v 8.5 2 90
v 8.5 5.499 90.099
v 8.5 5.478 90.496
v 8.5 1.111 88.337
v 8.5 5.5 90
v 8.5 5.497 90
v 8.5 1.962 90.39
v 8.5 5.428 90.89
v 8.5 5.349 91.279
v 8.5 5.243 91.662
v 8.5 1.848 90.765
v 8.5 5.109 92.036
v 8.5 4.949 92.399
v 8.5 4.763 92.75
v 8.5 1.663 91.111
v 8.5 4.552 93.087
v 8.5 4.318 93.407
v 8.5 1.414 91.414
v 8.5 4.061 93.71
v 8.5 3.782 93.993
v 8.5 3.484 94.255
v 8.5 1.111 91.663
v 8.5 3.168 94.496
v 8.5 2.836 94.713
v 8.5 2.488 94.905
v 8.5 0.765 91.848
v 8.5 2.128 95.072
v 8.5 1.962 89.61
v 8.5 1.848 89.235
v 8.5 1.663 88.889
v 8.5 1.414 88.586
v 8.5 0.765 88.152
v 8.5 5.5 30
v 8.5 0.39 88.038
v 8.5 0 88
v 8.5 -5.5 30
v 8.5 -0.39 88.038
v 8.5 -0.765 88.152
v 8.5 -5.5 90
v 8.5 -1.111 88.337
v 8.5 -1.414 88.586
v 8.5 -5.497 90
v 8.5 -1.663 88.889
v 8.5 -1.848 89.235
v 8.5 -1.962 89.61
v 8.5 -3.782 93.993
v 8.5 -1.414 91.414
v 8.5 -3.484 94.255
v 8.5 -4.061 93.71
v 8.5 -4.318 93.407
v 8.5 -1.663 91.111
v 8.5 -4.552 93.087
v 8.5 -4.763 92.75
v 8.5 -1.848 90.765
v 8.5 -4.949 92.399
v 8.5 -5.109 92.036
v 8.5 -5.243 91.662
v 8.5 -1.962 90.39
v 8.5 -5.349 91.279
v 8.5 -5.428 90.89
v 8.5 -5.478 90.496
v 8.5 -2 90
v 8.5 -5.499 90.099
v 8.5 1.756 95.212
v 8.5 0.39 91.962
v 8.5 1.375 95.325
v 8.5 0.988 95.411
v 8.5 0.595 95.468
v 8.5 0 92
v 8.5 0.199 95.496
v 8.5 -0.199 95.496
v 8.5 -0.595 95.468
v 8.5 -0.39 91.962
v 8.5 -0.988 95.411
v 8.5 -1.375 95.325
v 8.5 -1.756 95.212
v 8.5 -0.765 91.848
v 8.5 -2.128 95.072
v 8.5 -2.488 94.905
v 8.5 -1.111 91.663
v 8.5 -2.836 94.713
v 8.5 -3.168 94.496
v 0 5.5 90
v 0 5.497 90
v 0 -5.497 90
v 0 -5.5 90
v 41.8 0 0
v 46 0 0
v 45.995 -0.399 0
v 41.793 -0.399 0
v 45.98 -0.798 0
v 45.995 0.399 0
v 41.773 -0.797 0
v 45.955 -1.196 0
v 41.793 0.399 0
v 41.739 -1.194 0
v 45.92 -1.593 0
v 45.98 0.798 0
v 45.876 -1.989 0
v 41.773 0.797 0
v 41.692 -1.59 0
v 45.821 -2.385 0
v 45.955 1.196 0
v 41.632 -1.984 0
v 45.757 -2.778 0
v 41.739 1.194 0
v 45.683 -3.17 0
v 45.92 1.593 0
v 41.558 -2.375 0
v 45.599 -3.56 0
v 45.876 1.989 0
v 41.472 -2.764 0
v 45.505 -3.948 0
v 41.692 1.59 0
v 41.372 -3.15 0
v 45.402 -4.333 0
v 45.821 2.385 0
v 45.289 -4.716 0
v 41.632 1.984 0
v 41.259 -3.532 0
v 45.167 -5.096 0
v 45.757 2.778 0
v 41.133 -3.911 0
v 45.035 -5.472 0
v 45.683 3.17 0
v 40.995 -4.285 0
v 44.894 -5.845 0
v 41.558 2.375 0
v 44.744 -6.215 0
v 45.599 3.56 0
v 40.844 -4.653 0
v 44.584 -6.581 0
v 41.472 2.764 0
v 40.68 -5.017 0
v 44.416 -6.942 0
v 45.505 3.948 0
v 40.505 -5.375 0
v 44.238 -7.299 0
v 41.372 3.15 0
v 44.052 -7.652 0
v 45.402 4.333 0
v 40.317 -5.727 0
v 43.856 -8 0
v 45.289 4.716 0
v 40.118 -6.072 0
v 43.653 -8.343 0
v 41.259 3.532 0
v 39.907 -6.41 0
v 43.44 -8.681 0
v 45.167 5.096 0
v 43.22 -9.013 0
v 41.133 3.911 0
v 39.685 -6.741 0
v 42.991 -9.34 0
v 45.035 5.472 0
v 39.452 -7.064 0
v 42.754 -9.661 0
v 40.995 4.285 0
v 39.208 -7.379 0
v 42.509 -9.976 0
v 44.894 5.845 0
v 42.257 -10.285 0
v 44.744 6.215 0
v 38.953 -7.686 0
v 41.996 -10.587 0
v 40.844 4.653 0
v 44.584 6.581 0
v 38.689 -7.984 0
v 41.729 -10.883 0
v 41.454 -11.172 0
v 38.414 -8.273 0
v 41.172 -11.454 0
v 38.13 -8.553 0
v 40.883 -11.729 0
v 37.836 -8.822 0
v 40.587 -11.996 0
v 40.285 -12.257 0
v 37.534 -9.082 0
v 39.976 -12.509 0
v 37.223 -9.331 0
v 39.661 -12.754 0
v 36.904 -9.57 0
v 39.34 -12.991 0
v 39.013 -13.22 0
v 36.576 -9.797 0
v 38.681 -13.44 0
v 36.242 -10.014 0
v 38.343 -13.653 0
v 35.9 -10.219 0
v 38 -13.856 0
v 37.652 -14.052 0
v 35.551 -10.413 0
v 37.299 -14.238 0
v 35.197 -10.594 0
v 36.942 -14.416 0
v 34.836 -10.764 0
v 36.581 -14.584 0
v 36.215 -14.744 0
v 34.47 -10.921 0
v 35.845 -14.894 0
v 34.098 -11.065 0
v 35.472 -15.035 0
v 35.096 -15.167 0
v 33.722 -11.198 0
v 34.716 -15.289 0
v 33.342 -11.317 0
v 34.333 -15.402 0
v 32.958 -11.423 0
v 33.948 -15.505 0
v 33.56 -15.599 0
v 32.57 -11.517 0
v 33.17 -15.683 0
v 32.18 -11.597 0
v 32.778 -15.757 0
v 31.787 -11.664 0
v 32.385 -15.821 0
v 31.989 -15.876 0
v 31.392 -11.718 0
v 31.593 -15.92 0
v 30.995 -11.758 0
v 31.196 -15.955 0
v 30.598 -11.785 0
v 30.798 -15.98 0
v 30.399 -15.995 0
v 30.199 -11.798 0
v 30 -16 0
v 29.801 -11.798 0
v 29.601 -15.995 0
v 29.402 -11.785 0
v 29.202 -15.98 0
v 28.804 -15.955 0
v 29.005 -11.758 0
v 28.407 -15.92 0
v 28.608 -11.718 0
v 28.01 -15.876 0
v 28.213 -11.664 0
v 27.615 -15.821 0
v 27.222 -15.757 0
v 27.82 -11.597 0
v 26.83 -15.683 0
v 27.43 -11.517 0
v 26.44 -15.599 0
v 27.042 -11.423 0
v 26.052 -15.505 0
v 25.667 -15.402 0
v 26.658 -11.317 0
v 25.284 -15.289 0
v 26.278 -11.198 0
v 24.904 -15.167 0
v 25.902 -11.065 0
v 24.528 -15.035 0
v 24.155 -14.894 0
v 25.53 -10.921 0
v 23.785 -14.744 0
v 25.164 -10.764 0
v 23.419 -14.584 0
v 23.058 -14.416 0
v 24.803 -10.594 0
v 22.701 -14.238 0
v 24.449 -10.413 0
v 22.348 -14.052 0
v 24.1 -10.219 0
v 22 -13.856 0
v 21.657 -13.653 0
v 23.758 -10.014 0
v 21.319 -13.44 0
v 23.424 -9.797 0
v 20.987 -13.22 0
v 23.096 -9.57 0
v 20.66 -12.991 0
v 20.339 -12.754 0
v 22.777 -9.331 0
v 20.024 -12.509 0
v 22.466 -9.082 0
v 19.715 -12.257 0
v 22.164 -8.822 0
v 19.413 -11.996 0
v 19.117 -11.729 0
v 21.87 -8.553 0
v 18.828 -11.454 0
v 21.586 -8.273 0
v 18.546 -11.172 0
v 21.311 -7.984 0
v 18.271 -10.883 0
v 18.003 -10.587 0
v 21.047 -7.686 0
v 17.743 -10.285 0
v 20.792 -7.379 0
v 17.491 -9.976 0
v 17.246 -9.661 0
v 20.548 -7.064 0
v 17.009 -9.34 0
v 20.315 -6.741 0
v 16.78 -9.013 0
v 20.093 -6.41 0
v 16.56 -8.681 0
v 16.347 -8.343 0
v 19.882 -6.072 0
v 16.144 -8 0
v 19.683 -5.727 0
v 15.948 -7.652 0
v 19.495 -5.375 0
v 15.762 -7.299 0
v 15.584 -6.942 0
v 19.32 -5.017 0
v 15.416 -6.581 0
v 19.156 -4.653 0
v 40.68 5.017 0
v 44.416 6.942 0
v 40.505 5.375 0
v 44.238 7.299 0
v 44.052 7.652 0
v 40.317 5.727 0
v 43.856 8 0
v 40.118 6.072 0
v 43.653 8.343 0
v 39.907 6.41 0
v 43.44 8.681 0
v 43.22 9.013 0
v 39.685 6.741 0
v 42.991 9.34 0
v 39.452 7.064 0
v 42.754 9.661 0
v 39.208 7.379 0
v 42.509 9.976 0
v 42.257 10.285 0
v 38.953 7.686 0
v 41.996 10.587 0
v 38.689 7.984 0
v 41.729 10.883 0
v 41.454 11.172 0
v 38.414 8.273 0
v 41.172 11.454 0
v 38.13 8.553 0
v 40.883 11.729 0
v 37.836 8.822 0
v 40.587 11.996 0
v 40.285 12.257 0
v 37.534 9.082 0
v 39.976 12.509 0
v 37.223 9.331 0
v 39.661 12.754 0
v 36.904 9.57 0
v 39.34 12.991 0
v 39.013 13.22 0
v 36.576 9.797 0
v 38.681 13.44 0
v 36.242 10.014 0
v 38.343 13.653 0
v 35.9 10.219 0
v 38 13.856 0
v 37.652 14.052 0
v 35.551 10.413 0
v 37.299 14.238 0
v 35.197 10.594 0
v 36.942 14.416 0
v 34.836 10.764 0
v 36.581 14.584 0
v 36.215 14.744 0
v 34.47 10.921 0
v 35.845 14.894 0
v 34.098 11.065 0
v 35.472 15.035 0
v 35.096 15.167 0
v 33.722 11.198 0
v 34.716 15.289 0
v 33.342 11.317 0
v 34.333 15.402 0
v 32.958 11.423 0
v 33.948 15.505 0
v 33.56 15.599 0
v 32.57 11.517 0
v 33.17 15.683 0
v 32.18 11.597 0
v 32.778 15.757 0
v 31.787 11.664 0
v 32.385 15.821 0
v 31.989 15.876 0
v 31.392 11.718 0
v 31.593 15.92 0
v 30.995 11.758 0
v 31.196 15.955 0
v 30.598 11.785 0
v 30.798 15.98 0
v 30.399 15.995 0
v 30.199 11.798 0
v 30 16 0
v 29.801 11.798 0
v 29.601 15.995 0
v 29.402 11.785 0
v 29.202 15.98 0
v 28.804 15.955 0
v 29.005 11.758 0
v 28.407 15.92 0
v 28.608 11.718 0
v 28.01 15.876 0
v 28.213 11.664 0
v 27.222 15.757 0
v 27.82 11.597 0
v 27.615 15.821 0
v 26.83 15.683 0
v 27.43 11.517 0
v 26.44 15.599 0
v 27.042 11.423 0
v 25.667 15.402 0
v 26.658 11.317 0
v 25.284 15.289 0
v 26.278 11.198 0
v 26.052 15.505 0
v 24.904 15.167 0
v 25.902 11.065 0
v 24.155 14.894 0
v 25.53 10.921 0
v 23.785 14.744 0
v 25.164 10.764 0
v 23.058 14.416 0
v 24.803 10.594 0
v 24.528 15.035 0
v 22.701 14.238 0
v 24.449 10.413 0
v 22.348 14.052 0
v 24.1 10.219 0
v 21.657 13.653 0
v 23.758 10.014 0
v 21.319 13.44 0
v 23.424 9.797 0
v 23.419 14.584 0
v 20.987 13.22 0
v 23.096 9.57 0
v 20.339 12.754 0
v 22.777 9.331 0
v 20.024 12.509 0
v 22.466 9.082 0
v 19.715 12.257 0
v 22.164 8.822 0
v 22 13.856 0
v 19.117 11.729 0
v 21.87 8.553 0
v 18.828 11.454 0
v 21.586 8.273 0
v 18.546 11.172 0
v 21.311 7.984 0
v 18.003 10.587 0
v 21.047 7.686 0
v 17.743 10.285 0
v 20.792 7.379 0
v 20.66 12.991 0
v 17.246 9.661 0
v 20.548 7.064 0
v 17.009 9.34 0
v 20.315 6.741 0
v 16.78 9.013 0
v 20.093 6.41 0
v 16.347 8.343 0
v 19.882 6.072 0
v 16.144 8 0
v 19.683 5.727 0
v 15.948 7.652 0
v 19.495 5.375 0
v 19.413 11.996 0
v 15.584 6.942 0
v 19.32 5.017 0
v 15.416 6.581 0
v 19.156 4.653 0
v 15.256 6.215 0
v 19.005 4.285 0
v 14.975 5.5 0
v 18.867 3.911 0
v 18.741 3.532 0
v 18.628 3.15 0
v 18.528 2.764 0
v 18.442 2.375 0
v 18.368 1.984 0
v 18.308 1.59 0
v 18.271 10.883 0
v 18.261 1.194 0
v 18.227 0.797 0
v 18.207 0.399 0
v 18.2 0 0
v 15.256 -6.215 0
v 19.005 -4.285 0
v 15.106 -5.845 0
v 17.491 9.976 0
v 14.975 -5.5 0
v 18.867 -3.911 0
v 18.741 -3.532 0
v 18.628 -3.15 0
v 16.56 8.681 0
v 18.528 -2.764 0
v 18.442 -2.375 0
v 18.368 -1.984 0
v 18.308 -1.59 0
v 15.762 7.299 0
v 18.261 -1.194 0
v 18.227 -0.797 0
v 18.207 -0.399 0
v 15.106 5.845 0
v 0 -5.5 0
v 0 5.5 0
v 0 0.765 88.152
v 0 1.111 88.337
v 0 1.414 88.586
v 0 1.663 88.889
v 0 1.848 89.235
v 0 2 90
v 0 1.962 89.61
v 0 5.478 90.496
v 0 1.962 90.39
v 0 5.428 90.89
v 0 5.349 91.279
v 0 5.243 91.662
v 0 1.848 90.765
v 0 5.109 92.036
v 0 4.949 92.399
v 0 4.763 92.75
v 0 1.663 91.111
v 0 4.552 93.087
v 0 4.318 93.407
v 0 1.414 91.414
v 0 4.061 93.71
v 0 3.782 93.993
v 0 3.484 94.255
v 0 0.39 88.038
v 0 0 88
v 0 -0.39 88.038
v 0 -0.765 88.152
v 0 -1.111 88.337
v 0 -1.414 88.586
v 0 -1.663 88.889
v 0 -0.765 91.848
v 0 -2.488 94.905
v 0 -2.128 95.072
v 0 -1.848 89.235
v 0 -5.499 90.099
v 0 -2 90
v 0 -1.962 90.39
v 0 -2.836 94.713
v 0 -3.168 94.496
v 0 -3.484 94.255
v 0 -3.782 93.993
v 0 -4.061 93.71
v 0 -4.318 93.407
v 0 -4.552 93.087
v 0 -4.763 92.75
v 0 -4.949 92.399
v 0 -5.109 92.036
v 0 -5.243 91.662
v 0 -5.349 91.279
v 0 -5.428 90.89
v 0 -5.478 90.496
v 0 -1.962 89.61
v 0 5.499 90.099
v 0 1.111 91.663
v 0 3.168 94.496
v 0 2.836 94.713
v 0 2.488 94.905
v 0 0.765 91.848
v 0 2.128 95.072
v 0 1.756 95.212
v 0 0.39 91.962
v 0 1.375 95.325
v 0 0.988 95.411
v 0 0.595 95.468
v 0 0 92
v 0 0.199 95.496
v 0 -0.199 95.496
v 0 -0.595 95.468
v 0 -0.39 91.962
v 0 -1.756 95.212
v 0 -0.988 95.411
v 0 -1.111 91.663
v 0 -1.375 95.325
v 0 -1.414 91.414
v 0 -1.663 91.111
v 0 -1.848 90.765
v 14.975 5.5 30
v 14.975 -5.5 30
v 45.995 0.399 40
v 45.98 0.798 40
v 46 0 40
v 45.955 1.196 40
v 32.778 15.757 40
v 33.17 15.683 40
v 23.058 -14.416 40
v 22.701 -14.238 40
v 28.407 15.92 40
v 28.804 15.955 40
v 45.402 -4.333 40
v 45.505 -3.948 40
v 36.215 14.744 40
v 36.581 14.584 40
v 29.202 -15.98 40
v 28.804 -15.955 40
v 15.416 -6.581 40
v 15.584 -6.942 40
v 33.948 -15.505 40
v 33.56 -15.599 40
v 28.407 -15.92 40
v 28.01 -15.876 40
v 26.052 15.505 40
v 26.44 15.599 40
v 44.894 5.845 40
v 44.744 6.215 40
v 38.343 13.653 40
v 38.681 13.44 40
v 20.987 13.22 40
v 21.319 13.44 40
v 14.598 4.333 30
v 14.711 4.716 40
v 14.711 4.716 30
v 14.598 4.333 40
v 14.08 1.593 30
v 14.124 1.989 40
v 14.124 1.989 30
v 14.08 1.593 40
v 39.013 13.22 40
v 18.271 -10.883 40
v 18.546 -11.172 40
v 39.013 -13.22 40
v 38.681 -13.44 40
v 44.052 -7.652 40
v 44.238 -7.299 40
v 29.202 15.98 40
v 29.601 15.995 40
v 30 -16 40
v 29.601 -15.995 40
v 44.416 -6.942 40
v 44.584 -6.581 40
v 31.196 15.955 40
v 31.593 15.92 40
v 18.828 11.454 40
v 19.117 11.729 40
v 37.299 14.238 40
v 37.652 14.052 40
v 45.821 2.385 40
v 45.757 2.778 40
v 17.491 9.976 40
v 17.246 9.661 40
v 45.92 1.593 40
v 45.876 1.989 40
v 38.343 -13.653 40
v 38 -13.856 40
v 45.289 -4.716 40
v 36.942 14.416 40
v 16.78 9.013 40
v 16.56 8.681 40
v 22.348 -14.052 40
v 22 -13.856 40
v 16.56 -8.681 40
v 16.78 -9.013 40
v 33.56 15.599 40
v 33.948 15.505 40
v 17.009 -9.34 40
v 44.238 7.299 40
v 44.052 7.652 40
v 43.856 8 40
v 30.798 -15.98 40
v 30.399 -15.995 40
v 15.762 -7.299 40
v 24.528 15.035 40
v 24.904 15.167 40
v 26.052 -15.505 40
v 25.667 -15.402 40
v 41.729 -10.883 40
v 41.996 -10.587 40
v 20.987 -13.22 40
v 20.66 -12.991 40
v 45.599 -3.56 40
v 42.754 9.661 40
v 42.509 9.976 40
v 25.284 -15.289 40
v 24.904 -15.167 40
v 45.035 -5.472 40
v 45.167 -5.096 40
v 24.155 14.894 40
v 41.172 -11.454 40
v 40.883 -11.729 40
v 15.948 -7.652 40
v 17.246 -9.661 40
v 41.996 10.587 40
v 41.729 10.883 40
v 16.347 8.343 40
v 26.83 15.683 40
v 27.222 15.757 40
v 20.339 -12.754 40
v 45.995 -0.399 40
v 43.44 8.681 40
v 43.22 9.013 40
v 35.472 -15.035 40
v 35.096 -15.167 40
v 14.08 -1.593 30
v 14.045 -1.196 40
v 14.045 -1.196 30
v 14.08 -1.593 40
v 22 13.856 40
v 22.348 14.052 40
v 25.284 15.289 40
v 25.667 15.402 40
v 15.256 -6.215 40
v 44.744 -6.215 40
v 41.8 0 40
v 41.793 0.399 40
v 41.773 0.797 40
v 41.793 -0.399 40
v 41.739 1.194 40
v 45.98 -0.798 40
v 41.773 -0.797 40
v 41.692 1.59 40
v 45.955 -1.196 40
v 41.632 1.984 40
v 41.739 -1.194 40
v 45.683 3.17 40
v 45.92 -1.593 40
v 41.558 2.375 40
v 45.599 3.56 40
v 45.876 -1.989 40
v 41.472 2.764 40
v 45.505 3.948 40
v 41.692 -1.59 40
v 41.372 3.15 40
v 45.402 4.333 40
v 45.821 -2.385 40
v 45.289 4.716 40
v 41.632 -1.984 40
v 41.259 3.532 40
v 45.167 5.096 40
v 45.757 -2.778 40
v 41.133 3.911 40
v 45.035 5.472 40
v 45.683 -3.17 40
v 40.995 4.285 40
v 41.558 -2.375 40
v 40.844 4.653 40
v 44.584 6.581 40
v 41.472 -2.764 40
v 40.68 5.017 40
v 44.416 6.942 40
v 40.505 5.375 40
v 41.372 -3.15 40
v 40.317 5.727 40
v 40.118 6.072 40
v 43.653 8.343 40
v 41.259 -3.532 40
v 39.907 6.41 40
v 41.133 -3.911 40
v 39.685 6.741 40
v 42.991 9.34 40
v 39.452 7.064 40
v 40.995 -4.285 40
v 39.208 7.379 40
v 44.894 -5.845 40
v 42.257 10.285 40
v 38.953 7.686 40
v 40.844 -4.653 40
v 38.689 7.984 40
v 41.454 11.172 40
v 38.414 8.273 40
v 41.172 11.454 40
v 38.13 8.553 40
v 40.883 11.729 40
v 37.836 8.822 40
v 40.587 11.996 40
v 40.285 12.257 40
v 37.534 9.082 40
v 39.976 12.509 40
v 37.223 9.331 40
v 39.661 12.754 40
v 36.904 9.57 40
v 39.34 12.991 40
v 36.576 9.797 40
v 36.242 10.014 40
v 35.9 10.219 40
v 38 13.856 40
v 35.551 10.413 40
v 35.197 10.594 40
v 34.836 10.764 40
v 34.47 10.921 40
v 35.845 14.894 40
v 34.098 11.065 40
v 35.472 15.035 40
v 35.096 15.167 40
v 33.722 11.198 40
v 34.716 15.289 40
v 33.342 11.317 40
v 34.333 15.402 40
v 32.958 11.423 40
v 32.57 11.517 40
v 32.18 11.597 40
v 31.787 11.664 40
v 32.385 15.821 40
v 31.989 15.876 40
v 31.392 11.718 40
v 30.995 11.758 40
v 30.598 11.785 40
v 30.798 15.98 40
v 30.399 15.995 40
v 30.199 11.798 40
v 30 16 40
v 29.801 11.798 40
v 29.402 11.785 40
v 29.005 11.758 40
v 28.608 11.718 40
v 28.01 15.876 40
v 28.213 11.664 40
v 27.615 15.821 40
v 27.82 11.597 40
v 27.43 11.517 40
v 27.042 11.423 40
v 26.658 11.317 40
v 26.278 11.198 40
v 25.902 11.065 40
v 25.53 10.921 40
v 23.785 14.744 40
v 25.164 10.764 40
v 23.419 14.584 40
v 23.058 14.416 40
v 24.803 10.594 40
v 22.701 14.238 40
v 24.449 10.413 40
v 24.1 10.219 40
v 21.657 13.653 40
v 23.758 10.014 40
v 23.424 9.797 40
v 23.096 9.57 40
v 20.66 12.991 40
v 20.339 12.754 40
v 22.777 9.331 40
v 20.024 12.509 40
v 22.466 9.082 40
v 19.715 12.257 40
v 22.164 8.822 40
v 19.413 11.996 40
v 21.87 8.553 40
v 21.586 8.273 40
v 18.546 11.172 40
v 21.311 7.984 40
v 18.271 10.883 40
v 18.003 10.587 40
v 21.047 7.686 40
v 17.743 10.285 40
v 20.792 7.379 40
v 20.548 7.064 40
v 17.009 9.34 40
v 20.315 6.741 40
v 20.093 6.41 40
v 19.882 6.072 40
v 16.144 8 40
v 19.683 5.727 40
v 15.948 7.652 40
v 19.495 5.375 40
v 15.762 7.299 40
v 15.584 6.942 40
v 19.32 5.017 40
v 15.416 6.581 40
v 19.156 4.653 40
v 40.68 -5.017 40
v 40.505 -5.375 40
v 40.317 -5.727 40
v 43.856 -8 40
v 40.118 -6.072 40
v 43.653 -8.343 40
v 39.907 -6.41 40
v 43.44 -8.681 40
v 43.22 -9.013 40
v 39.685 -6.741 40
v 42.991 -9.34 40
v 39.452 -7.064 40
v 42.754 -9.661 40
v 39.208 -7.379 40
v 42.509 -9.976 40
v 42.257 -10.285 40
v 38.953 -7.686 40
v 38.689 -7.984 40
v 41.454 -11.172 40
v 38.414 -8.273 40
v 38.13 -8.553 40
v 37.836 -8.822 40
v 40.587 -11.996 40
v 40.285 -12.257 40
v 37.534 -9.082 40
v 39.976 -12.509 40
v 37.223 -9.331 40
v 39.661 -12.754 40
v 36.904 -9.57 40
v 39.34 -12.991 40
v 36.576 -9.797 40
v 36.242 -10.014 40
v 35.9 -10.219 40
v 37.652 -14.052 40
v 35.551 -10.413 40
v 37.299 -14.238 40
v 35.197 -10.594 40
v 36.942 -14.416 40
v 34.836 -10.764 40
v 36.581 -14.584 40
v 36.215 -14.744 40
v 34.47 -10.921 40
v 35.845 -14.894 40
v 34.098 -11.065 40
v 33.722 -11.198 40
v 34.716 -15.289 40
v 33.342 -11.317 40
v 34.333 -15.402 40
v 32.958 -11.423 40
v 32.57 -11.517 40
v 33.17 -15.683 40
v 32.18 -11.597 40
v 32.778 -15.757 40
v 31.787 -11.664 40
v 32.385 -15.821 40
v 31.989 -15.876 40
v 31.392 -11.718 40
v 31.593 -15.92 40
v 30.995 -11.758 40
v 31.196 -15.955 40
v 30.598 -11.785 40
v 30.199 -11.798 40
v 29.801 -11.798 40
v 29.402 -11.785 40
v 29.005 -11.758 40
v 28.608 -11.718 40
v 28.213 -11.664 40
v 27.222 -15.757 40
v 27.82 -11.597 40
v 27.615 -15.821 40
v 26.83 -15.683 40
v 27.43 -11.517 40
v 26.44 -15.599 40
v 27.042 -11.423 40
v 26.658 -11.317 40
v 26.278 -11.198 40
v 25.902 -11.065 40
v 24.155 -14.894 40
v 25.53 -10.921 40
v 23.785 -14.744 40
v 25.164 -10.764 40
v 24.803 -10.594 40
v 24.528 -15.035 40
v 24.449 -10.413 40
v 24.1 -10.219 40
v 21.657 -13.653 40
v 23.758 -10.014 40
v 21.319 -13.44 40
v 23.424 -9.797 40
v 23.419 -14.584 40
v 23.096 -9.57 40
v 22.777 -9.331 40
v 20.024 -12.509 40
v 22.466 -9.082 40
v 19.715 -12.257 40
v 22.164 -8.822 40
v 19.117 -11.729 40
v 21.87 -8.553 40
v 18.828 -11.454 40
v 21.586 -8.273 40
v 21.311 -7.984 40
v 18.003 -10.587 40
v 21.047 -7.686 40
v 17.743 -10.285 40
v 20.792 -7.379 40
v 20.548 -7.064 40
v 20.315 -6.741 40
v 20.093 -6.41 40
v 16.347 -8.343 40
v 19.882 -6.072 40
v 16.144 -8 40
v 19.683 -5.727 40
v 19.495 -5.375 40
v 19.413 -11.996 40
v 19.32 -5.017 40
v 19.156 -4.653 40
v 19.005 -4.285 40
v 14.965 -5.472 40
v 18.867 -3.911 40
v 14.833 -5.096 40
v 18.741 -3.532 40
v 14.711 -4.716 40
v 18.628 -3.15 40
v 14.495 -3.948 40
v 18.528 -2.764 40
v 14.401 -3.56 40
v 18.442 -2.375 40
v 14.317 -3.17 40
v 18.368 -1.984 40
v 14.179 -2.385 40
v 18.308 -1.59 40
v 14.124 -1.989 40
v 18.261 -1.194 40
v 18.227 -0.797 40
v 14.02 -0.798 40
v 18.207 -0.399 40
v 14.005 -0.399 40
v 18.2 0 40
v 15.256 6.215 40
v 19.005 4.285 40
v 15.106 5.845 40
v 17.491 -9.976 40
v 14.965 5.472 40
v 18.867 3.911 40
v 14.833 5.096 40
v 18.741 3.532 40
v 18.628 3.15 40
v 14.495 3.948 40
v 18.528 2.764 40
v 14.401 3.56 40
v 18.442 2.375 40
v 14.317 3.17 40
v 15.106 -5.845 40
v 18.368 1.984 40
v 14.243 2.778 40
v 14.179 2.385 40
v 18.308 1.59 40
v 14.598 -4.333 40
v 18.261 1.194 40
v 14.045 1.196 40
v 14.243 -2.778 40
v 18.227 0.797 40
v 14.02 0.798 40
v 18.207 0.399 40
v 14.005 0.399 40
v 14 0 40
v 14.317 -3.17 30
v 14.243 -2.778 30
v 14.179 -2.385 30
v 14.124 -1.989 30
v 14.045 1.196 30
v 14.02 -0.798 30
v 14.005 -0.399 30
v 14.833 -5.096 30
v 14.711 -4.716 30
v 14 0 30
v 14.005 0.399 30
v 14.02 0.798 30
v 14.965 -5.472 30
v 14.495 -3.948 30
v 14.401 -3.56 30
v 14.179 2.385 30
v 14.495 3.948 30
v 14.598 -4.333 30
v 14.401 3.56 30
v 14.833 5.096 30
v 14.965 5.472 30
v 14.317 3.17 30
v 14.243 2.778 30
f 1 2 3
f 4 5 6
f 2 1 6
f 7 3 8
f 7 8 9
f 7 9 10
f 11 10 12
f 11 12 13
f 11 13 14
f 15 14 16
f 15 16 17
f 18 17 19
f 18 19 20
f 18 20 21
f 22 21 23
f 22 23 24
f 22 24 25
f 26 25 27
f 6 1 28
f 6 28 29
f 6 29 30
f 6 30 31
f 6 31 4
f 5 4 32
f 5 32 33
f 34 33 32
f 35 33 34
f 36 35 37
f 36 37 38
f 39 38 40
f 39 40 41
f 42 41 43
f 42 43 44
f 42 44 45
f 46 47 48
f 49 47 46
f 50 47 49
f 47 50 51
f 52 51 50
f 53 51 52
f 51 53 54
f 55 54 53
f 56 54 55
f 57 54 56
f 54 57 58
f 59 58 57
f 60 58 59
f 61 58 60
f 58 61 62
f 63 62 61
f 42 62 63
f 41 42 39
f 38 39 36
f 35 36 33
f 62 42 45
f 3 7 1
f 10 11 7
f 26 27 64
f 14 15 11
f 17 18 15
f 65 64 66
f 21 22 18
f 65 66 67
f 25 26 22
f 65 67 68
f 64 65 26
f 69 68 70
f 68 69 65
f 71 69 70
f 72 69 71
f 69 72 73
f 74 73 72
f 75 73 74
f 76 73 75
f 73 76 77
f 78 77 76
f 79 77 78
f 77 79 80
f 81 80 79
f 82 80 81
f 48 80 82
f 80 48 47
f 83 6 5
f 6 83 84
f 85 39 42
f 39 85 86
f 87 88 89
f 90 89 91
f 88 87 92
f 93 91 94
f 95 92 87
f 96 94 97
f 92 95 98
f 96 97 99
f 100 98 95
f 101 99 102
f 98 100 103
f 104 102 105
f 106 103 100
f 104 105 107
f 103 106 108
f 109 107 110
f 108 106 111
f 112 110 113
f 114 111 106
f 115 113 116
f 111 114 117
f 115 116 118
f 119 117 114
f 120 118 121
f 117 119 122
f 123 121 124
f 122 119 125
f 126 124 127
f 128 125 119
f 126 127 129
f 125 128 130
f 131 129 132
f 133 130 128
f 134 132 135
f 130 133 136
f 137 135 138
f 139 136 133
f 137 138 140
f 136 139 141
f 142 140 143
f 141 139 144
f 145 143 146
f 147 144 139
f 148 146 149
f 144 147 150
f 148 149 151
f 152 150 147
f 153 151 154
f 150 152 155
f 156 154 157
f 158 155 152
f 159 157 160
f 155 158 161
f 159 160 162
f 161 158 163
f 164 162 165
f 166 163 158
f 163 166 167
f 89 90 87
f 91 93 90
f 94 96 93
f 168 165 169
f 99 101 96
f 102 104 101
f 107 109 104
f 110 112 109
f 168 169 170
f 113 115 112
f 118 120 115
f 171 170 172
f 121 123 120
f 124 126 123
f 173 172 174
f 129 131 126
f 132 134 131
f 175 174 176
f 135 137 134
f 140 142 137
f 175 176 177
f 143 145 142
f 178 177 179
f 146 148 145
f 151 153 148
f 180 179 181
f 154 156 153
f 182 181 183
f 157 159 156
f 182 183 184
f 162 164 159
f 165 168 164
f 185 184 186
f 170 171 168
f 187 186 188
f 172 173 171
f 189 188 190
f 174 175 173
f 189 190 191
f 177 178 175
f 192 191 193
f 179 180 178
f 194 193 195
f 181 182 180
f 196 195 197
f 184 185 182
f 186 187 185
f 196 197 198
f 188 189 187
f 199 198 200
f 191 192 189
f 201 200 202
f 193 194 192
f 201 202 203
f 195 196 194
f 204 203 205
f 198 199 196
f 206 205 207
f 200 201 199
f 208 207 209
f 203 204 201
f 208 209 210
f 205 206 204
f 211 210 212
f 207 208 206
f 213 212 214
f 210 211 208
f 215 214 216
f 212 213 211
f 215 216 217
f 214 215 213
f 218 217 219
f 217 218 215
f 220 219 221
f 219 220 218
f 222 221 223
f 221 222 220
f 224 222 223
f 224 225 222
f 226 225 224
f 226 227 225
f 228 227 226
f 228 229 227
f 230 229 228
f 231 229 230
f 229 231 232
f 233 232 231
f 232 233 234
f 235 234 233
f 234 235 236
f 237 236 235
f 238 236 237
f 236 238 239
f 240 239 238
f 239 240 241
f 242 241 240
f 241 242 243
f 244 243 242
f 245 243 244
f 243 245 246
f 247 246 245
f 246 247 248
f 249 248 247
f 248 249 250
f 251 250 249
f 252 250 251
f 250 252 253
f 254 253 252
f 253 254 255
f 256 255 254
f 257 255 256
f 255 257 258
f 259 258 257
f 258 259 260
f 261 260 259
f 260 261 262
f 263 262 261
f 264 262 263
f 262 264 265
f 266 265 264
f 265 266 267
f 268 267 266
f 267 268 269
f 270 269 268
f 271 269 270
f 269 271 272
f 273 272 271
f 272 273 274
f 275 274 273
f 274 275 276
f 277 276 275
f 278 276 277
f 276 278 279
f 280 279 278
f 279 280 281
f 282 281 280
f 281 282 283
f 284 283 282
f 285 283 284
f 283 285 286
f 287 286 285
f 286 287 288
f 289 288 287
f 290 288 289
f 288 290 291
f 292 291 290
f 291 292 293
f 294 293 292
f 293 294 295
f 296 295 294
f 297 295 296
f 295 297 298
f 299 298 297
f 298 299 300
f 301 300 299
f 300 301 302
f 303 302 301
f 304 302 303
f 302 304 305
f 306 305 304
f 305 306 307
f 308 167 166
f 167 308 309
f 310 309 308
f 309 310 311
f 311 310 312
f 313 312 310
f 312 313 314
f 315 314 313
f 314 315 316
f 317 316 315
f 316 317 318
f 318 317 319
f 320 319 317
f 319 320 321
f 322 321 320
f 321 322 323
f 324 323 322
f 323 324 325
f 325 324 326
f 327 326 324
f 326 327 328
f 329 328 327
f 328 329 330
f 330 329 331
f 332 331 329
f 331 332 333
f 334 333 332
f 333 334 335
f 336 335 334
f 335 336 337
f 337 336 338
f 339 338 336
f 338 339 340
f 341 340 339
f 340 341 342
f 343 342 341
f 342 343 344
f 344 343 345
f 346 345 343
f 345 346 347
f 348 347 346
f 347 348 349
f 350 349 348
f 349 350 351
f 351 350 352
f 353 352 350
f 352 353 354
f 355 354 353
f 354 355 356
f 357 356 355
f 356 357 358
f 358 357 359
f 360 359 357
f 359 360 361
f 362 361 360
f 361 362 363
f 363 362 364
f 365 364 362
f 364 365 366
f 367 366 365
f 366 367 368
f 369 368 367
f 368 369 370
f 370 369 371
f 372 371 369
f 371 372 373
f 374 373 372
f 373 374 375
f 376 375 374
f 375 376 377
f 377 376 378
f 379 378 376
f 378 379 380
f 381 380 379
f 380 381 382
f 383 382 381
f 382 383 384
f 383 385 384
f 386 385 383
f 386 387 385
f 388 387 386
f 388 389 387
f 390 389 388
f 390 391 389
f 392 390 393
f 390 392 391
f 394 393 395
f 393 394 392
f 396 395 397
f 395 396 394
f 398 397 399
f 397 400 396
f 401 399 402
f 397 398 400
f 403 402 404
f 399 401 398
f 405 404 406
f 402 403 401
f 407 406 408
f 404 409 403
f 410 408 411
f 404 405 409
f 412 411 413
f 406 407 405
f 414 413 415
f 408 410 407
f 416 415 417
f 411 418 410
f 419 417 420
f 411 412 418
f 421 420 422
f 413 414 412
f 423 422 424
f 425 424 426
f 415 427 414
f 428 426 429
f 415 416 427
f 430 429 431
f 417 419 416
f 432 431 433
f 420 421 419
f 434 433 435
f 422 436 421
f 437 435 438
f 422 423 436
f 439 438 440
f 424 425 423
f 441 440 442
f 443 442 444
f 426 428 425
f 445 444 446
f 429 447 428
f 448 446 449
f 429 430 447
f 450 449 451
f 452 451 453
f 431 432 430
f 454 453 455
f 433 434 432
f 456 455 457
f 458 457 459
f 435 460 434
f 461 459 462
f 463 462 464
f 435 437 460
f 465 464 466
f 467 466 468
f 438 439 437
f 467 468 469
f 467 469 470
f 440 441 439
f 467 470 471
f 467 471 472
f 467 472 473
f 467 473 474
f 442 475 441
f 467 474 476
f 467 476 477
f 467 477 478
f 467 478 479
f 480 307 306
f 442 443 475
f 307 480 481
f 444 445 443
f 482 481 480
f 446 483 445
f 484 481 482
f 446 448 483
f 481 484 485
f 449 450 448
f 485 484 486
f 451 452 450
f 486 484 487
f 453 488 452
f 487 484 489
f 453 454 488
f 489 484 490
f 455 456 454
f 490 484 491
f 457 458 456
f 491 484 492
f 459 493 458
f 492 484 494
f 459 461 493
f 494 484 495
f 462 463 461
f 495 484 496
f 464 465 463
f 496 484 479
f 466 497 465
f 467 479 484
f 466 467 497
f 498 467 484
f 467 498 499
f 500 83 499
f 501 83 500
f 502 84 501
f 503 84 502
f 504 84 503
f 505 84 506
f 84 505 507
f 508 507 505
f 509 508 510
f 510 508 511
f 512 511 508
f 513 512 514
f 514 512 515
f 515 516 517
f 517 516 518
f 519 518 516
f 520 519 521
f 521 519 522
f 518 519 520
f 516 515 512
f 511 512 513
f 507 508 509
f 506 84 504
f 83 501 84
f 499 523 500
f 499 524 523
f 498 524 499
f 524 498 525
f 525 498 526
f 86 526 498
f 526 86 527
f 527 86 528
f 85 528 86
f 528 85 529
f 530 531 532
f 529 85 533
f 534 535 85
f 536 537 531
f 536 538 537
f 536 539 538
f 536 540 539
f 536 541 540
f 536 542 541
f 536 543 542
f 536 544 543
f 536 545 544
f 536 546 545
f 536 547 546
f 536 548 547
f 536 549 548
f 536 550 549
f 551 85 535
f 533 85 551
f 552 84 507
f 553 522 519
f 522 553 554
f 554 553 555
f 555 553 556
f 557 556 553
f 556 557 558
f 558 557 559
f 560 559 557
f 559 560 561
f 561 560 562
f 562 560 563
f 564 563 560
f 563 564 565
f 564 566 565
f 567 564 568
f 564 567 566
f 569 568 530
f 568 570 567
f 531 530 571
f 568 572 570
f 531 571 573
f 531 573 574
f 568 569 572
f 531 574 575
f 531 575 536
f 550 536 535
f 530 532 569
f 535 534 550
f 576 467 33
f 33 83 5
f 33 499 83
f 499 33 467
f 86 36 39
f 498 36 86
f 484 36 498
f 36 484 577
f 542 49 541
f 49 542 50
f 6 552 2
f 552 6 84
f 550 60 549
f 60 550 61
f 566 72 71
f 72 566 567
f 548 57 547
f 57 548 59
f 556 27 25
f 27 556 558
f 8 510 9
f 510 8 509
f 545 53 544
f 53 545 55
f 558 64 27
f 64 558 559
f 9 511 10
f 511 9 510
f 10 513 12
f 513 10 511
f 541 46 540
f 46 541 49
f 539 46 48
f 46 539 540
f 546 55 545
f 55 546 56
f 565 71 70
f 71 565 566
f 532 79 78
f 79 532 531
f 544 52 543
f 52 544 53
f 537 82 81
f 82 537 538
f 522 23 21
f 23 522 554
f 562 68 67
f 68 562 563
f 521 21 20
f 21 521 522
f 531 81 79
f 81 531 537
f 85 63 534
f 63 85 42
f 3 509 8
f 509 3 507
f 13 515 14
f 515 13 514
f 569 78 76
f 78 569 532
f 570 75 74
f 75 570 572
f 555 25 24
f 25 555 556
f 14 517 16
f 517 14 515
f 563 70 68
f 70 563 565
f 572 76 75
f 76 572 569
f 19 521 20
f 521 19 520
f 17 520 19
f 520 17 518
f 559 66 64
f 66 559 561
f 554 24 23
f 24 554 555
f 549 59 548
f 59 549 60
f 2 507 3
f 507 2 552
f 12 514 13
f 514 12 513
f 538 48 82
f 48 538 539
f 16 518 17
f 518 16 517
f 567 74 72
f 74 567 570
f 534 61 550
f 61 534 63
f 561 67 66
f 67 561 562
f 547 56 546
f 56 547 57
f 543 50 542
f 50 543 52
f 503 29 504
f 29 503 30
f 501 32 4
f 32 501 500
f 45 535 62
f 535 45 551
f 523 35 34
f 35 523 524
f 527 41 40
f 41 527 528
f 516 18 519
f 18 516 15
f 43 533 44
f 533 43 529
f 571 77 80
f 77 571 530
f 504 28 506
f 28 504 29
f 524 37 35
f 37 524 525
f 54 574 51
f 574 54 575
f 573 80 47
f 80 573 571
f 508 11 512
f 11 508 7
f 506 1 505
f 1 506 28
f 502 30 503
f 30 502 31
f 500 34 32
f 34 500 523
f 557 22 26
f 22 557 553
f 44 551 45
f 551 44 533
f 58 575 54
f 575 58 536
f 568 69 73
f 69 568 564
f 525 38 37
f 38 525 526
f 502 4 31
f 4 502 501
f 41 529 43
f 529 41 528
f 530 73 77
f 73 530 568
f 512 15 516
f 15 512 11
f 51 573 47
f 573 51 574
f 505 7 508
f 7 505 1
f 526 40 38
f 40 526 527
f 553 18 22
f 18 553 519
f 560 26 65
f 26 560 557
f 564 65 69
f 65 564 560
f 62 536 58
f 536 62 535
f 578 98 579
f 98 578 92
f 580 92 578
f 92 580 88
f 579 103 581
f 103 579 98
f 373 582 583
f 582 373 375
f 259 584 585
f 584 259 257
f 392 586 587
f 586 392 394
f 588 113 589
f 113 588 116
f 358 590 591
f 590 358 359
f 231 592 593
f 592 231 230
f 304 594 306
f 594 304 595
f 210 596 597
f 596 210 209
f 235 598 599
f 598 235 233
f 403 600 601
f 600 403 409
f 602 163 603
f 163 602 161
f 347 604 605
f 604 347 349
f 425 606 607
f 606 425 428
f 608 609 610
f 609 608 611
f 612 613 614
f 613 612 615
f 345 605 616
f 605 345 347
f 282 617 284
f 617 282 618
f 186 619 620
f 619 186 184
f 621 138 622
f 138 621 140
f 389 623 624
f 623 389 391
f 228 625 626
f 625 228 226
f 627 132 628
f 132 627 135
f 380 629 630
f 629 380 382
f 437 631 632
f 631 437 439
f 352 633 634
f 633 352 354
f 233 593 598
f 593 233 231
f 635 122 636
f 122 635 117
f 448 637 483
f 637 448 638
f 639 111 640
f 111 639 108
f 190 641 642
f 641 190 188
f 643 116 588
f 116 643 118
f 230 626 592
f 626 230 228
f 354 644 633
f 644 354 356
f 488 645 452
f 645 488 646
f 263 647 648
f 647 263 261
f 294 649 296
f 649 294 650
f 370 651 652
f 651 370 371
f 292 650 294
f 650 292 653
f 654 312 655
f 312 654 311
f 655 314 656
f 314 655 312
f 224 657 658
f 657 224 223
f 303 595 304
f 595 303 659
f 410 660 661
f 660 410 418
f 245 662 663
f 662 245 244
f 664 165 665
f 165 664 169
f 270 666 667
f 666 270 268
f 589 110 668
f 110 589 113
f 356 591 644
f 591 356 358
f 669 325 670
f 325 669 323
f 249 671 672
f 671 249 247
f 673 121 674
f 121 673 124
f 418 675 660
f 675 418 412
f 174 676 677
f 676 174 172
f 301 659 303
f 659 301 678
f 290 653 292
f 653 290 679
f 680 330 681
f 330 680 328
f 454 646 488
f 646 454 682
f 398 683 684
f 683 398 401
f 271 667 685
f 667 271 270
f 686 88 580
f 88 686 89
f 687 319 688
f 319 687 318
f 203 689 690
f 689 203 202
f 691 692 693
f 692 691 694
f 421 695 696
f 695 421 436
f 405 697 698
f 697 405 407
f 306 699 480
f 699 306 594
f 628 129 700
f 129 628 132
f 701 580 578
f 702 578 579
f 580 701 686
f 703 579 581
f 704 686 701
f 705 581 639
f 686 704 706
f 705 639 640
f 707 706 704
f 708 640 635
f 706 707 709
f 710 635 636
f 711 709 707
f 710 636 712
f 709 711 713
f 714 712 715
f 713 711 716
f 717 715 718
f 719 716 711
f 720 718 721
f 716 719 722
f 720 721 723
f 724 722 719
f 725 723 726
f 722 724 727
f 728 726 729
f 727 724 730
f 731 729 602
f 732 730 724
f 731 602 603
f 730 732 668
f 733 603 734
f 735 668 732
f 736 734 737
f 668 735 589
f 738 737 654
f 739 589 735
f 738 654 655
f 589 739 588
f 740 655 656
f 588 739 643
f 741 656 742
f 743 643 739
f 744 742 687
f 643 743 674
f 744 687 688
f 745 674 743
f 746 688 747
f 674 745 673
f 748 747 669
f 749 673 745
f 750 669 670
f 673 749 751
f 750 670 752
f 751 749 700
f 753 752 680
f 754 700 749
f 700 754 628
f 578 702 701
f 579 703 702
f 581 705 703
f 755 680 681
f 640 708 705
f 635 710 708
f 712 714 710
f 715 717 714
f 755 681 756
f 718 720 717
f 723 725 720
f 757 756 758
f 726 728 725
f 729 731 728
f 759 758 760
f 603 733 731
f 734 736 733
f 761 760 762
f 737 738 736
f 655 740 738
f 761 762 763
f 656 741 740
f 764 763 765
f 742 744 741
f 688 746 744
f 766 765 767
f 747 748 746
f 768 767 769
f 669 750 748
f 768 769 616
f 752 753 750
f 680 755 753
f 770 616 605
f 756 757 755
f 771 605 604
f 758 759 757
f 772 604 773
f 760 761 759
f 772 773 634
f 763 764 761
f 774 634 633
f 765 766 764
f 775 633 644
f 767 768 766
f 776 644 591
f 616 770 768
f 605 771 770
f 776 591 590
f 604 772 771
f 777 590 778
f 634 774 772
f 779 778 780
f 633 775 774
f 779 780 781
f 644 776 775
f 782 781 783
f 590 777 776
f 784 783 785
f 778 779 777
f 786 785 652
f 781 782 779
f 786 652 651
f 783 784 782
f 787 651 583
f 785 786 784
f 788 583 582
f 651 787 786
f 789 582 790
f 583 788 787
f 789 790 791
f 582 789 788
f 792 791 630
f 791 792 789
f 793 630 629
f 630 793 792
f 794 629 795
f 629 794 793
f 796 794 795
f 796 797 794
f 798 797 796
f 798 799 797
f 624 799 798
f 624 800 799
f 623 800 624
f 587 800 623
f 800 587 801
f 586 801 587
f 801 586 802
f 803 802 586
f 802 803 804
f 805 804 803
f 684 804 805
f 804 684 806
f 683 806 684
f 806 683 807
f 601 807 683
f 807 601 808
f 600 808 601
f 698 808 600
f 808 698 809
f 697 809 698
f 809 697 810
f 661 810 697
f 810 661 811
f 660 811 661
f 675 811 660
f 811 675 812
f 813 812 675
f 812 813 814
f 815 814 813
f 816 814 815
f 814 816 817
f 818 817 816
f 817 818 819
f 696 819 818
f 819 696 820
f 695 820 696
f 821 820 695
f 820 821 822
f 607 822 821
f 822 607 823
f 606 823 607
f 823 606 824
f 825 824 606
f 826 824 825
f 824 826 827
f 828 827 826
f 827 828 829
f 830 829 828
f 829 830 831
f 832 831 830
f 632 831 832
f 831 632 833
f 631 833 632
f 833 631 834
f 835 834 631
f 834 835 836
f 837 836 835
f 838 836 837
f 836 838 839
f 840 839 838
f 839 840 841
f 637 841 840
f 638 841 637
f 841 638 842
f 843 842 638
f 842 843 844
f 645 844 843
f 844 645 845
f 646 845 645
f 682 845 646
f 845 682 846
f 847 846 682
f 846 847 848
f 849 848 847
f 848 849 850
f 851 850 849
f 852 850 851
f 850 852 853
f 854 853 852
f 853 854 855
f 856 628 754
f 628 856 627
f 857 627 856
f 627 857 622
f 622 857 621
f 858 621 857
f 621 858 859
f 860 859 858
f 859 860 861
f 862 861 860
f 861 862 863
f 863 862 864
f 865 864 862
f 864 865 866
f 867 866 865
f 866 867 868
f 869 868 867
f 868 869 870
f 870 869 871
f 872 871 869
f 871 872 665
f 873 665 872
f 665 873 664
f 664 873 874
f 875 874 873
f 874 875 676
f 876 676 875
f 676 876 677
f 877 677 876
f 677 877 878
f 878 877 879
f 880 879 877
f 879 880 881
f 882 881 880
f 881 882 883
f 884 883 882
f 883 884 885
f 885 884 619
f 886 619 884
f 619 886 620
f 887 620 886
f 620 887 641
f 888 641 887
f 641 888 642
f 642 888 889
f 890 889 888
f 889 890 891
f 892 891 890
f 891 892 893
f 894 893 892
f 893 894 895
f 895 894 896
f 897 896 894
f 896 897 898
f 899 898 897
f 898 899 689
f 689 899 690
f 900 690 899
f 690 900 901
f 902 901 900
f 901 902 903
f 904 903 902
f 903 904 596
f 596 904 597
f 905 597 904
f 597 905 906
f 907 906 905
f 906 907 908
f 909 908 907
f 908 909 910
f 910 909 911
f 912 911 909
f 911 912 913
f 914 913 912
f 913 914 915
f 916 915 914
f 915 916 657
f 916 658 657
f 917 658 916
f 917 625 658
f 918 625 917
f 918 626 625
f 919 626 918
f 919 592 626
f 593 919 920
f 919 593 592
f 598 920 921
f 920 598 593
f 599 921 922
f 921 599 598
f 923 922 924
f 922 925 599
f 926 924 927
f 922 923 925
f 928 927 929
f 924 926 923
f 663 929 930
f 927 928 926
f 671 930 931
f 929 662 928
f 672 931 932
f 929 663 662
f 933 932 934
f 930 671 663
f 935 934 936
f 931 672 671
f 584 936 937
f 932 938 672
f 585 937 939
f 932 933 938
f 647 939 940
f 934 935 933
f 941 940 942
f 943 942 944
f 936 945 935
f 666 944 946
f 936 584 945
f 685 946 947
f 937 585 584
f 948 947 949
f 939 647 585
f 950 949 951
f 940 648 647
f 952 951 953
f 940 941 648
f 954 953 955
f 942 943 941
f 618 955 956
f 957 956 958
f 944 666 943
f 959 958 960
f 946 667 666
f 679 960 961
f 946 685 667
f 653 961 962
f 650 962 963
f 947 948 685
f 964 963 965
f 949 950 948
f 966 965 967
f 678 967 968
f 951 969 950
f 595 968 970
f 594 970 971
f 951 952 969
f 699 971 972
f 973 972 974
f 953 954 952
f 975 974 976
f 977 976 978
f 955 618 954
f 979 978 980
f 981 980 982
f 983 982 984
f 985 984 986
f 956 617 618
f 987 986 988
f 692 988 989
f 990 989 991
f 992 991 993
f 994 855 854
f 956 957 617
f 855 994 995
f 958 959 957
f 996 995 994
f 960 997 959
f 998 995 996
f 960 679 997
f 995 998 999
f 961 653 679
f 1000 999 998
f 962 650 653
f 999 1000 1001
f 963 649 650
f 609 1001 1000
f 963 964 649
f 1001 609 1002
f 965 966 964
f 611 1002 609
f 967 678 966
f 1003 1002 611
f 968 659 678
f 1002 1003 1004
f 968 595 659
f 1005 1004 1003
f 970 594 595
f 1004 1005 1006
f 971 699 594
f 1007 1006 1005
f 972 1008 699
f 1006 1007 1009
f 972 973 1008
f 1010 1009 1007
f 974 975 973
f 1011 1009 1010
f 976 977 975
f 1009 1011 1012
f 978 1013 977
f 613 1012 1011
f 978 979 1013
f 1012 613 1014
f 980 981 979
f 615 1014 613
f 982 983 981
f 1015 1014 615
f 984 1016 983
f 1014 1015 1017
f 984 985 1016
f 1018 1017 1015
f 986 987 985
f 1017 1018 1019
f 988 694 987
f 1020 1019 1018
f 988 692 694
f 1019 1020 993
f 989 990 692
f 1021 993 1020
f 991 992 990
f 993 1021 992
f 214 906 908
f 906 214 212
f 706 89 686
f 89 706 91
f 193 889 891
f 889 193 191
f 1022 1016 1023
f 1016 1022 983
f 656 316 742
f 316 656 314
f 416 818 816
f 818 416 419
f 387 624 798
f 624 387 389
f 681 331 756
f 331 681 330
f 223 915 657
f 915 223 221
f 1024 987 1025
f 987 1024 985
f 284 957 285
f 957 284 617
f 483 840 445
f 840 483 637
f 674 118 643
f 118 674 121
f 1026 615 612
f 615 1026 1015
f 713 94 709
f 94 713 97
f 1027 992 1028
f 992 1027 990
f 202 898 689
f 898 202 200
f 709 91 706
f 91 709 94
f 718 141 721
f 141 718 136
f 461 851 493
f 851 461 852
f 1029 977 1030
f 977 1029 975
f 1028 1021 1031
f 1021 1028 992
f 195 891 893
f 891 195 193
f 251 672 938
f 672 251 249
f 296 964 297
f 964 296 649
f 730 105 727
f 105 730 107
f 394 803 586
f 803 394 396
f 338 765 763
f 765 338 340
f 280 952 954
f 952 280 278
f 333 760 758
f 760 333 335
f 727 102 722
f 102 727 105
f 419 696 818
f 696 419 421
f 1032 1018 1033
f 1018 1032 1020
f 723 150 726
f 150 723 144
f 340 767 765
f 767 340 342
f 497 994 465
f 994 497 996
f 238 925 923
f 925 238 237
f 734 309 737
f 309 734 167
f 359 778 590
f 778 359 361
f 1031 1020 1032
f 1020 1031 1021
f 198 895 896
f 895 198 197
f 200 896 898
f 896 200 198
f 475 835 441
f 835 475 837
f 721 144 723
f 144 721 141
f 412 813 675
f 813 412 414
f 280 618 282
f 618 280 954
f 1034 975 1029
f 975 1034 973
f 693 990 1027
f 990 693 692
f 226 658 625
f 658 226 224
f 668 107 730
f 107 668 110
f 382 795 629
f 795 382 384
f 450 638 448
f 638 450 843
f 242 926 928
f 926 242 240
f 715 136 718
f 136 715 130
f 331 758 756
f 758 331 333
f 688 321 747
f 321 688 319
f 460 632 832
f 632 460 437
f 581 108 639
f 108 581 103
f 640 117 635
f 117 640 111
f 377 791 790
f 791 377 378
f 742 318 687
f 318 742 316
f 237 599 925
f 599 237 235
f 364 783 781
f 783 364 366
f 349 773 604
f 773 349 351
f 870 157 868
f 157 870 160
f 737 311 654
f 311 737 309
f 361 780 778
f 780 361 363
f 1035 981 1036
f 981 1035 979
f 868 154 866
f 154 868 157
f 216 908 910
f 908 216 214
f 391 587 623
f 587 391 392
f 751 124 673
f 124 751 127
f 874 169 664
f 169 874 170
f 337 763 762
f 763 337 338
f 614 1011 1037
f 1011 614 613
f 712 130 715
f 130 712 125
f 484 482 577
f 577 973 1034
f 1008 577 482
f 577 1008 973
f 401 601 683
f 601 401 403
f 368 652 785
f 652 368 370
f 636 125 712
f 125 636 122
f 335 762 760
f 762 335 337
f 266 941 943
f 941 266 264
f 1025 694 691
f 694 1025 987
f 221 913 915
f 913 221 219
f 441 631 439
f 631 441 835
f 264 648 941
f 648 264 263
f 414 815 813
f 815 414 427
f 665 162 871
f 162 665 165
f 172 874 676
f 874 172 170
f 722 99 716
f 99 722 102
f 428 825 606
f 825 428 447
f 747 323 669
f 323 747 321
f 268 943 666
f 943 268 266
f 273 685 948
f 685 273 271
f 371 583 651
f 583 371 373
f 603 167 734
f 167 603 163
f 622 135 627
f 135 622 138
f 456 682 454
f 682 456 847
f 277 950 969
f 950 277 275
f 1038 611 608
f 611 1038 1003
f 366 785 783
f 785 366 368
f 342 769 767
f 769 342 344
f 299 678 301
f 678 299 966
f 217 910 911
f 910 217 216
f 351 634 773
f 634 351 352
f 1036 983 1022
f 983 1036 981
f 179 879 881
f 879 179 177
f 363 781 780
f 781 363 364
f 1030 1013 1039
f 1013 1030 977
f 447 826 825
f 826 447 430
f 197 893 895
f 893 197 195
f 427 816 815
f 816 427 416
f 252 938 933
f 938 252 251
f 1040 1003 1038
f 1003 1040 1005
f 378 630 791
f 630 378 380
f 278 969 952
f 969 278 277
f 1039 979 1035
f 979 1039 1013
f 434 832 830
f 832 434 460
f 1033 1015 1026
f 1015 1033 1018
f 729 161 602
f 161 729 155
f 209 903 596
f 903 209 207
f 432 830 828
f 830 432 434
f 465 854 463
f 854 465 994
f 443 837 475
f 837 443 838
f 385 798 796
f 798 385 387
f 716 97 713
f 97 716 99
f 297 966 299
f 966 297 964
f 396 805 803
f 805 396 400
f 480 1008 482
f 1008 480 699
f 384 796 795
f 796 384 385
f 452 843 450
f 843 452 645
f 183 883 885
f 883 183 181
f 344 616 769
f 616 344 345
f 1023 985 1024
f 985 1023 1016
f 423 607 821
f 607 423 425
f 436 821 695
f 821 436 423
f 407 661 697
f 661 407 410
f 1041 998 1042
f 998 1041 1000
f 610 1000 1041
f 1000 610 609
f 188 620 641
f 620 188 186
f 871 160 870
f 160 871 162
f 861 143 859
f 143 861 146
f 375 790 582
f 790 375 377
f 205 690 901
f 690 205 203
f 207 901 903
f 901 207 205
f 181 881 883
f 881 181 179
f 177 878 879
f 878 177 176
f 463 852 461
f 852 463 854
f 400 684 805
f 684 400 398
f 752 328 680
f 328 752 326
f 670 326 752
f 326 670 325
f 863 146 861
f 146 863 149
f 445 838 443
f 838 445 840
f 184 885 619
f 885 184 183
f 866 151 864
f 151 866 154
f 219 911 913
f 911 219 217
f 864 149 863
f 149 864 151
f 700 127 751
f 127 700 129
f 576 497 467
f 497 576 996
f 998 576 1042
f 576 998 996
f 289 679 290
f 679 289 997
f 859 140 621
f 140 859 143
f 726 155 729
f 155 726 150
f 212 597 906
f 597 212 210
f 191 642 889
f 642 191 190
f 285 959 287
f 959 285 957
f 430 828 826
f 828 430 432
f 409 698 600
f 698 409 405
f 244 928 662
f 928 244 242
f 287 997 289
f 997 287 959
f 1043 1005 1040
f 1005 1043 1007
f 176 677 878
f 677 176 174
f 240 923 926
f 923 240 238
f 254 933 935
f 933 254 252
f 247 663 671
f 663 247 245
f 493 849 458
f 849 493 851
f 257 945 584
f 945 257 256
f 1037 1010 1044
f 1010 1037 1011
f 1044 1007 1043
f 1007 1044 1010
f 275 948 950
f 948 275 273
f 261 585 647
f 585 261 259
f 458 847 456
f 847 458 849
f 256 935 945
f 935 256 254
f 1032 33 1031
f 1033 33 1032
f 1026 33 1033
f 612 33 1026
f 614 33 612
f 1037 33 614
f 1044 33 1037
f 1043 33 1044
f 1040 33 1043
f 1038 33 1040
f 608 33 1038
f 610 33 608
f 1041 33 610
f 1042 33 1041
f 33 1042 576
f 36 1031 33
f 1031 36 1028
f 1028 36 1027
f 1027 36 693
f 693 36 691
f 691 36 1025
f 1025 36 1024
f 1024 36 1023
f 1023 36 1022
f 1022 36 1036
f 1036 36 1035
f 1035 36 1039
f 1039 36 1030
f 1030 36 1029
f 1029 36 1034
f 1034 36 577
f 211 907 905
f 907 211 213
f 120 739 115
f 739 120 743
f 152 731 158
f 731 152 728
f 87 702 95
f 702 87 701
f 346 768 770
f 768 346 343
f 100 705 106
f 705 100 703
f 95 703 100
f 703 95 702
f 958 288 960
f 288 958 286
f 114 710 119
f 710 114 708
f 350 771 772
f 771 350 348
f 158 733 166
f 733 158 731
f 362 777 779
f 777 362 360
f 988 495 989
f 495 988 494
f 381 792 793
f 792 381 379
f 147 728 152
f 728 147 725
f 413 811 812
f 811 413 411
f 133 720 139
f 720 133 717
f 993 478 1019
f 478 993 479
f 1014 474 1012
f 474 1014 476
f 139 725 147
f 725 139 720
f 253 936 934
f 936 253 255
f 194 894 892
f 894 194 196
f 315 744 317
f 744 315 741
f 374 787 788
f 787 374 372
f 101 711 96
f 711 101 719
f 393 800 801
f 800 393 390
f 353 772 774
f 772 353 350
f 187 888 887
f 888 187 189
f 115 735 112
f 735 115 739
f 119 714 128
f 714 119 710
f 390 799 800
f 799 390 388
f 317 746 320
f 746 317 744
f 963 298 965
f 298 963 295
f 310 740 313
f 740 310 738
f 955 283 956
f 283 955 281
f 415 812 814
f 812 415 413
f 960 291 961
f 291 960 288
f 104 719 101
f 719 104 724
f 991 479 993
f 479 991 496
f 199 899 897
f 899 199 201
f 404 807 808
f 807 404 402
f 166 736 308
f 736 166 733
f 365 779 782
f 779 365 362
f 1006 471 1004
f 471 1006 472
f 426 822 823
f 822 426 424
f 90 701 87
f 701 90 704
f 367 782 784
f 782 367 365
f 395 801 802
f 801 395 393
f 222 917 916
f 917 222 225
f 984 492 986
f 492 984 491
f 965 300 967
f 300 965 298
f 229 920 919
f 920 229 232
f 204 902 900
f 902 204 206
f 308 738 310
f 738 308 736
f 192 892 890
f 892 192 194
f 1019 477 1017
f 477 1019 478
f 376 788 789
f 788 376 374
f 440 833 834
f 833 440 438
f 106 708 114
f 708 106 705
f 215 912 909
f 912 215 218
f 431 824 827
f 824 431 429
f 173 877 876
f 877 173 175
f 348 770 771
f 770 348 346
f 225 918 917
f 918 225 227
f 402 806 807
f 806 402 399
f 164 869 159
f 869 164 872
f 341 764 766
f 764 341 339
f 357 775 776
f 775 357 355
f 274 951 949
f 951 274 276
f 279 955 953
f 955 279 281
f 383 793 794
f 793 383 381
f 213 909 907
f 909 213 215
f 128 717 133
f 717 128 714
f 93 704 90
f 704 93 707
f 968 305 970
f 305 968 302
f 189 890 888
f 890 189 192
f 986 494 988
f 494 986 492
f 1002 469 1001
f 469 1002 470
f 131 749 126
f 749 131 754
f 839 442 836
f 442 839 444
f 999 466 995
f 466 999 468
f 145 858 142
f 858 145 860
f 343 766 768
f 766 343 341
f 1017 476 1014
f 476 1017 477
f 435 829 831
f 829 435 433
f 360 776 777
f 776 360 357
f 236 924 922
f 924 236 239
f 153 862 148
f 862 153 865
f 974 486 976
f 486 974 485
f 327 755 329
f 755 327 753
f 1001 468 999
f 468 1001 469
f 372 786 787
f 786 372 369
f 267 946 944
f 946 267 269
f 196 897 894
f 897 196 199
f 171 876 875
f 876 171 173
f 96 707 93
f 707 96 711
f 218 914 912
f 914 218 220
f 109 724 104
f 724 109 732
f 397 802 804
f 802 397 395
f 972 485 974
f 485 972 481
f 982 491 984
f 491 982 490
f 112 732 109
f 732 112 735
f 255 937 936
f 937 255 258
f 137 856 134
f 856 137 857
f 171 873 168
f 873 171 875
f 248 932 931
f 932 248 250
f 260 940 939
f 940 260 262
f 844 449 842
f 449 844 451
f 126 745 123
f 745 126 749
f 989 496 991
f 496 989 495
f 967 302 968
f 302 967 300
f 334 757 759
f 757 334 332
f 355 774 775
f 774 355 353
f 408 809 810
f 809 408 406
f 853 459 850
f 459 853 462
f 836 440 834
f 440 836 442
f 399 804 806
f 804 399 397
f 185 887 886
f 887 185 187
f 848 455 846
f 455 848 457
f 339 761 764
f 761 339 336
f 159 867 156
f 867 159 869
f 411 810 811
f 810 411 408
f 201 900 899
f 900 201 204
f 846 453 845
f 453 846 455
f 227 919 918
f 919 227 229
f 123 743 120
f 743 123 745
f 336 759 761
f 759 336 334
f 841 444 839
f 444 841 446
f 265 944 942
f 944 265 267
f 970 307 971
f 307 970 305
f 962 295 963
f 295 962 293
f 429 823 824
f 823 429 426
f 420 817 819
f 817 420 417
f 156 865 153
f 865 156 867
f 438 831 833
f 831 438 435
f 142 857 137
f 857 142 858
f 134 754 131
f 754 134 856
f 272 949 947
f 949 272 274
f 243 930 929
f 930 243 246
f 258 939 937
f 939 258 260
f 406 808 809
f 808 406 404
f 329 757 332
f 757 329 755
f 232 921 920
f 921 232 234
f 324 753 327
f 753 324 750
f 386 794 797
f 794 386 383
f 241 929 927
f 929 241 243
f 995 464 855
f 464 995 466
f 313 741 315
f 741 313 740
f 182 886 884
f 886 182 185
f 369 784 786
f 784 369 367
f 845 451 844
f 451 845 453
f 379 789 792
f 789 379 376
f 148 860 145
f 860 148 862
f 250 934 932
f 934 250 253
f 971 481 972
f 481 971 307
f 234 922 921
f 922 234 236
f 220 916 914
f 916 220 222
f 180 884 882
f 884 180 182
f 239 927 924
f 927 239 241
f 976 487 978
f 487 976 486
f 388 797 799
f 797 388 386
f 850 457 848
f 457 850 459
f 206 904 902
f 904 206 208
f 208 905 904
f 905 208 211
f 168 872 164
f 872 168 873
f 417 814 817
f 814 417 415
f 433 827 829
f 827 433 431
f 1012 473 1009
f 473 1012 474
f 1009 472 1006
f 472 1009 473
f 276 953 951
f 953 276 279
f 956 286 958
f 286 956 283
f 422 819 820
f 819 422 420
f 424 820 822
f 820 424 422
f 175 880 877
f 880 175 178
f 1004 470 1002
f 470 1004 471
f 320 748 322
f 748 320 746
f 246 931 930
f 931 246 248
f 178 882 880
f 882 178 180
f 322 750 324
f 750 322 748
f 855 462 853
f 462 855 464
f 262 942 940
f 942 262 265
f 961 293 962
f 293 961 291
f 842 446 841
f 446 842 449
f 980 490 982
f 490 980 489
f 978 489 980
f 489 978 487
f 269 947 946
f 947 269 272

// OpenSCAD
$fa = 1.0;
$fs = 0.4;

// cylinder(h = 60.0, d = 23.5);
// cylinder(h = 5.0, d = 40);

// cylinder(h = 60.2, d = 17);
// cube([70, 26, 5]);
// linear_extrude(30)
// polygon(c);
// translate([40, 8, 5])
// rotate([180, 0, 0])
// difference()
// union()

difference()
{
	union()
	{
		translate([0, -5.5, 0])
			cube([8.5, 11, 90]);

		translate([0, 0, 90])
			rotate([0, 90, 0])
				cylinder(h = 8.5, d = 11);

	}

	translate([-10, 0, 90])
		rotate([0, 90, 0])
			cylinder(h = 20, d = 4);
}

difference()
{
	union()
	{
		translate([30, 0, 0])
			cylinder(h = 40, d = 32);

		// bridge
		translate([0, -5.5, 0])
			cube([20, 11, 30]);
	}

	translate([30, 0, -10])
		cylinder(h = 60.0, d = 23.6);
}
